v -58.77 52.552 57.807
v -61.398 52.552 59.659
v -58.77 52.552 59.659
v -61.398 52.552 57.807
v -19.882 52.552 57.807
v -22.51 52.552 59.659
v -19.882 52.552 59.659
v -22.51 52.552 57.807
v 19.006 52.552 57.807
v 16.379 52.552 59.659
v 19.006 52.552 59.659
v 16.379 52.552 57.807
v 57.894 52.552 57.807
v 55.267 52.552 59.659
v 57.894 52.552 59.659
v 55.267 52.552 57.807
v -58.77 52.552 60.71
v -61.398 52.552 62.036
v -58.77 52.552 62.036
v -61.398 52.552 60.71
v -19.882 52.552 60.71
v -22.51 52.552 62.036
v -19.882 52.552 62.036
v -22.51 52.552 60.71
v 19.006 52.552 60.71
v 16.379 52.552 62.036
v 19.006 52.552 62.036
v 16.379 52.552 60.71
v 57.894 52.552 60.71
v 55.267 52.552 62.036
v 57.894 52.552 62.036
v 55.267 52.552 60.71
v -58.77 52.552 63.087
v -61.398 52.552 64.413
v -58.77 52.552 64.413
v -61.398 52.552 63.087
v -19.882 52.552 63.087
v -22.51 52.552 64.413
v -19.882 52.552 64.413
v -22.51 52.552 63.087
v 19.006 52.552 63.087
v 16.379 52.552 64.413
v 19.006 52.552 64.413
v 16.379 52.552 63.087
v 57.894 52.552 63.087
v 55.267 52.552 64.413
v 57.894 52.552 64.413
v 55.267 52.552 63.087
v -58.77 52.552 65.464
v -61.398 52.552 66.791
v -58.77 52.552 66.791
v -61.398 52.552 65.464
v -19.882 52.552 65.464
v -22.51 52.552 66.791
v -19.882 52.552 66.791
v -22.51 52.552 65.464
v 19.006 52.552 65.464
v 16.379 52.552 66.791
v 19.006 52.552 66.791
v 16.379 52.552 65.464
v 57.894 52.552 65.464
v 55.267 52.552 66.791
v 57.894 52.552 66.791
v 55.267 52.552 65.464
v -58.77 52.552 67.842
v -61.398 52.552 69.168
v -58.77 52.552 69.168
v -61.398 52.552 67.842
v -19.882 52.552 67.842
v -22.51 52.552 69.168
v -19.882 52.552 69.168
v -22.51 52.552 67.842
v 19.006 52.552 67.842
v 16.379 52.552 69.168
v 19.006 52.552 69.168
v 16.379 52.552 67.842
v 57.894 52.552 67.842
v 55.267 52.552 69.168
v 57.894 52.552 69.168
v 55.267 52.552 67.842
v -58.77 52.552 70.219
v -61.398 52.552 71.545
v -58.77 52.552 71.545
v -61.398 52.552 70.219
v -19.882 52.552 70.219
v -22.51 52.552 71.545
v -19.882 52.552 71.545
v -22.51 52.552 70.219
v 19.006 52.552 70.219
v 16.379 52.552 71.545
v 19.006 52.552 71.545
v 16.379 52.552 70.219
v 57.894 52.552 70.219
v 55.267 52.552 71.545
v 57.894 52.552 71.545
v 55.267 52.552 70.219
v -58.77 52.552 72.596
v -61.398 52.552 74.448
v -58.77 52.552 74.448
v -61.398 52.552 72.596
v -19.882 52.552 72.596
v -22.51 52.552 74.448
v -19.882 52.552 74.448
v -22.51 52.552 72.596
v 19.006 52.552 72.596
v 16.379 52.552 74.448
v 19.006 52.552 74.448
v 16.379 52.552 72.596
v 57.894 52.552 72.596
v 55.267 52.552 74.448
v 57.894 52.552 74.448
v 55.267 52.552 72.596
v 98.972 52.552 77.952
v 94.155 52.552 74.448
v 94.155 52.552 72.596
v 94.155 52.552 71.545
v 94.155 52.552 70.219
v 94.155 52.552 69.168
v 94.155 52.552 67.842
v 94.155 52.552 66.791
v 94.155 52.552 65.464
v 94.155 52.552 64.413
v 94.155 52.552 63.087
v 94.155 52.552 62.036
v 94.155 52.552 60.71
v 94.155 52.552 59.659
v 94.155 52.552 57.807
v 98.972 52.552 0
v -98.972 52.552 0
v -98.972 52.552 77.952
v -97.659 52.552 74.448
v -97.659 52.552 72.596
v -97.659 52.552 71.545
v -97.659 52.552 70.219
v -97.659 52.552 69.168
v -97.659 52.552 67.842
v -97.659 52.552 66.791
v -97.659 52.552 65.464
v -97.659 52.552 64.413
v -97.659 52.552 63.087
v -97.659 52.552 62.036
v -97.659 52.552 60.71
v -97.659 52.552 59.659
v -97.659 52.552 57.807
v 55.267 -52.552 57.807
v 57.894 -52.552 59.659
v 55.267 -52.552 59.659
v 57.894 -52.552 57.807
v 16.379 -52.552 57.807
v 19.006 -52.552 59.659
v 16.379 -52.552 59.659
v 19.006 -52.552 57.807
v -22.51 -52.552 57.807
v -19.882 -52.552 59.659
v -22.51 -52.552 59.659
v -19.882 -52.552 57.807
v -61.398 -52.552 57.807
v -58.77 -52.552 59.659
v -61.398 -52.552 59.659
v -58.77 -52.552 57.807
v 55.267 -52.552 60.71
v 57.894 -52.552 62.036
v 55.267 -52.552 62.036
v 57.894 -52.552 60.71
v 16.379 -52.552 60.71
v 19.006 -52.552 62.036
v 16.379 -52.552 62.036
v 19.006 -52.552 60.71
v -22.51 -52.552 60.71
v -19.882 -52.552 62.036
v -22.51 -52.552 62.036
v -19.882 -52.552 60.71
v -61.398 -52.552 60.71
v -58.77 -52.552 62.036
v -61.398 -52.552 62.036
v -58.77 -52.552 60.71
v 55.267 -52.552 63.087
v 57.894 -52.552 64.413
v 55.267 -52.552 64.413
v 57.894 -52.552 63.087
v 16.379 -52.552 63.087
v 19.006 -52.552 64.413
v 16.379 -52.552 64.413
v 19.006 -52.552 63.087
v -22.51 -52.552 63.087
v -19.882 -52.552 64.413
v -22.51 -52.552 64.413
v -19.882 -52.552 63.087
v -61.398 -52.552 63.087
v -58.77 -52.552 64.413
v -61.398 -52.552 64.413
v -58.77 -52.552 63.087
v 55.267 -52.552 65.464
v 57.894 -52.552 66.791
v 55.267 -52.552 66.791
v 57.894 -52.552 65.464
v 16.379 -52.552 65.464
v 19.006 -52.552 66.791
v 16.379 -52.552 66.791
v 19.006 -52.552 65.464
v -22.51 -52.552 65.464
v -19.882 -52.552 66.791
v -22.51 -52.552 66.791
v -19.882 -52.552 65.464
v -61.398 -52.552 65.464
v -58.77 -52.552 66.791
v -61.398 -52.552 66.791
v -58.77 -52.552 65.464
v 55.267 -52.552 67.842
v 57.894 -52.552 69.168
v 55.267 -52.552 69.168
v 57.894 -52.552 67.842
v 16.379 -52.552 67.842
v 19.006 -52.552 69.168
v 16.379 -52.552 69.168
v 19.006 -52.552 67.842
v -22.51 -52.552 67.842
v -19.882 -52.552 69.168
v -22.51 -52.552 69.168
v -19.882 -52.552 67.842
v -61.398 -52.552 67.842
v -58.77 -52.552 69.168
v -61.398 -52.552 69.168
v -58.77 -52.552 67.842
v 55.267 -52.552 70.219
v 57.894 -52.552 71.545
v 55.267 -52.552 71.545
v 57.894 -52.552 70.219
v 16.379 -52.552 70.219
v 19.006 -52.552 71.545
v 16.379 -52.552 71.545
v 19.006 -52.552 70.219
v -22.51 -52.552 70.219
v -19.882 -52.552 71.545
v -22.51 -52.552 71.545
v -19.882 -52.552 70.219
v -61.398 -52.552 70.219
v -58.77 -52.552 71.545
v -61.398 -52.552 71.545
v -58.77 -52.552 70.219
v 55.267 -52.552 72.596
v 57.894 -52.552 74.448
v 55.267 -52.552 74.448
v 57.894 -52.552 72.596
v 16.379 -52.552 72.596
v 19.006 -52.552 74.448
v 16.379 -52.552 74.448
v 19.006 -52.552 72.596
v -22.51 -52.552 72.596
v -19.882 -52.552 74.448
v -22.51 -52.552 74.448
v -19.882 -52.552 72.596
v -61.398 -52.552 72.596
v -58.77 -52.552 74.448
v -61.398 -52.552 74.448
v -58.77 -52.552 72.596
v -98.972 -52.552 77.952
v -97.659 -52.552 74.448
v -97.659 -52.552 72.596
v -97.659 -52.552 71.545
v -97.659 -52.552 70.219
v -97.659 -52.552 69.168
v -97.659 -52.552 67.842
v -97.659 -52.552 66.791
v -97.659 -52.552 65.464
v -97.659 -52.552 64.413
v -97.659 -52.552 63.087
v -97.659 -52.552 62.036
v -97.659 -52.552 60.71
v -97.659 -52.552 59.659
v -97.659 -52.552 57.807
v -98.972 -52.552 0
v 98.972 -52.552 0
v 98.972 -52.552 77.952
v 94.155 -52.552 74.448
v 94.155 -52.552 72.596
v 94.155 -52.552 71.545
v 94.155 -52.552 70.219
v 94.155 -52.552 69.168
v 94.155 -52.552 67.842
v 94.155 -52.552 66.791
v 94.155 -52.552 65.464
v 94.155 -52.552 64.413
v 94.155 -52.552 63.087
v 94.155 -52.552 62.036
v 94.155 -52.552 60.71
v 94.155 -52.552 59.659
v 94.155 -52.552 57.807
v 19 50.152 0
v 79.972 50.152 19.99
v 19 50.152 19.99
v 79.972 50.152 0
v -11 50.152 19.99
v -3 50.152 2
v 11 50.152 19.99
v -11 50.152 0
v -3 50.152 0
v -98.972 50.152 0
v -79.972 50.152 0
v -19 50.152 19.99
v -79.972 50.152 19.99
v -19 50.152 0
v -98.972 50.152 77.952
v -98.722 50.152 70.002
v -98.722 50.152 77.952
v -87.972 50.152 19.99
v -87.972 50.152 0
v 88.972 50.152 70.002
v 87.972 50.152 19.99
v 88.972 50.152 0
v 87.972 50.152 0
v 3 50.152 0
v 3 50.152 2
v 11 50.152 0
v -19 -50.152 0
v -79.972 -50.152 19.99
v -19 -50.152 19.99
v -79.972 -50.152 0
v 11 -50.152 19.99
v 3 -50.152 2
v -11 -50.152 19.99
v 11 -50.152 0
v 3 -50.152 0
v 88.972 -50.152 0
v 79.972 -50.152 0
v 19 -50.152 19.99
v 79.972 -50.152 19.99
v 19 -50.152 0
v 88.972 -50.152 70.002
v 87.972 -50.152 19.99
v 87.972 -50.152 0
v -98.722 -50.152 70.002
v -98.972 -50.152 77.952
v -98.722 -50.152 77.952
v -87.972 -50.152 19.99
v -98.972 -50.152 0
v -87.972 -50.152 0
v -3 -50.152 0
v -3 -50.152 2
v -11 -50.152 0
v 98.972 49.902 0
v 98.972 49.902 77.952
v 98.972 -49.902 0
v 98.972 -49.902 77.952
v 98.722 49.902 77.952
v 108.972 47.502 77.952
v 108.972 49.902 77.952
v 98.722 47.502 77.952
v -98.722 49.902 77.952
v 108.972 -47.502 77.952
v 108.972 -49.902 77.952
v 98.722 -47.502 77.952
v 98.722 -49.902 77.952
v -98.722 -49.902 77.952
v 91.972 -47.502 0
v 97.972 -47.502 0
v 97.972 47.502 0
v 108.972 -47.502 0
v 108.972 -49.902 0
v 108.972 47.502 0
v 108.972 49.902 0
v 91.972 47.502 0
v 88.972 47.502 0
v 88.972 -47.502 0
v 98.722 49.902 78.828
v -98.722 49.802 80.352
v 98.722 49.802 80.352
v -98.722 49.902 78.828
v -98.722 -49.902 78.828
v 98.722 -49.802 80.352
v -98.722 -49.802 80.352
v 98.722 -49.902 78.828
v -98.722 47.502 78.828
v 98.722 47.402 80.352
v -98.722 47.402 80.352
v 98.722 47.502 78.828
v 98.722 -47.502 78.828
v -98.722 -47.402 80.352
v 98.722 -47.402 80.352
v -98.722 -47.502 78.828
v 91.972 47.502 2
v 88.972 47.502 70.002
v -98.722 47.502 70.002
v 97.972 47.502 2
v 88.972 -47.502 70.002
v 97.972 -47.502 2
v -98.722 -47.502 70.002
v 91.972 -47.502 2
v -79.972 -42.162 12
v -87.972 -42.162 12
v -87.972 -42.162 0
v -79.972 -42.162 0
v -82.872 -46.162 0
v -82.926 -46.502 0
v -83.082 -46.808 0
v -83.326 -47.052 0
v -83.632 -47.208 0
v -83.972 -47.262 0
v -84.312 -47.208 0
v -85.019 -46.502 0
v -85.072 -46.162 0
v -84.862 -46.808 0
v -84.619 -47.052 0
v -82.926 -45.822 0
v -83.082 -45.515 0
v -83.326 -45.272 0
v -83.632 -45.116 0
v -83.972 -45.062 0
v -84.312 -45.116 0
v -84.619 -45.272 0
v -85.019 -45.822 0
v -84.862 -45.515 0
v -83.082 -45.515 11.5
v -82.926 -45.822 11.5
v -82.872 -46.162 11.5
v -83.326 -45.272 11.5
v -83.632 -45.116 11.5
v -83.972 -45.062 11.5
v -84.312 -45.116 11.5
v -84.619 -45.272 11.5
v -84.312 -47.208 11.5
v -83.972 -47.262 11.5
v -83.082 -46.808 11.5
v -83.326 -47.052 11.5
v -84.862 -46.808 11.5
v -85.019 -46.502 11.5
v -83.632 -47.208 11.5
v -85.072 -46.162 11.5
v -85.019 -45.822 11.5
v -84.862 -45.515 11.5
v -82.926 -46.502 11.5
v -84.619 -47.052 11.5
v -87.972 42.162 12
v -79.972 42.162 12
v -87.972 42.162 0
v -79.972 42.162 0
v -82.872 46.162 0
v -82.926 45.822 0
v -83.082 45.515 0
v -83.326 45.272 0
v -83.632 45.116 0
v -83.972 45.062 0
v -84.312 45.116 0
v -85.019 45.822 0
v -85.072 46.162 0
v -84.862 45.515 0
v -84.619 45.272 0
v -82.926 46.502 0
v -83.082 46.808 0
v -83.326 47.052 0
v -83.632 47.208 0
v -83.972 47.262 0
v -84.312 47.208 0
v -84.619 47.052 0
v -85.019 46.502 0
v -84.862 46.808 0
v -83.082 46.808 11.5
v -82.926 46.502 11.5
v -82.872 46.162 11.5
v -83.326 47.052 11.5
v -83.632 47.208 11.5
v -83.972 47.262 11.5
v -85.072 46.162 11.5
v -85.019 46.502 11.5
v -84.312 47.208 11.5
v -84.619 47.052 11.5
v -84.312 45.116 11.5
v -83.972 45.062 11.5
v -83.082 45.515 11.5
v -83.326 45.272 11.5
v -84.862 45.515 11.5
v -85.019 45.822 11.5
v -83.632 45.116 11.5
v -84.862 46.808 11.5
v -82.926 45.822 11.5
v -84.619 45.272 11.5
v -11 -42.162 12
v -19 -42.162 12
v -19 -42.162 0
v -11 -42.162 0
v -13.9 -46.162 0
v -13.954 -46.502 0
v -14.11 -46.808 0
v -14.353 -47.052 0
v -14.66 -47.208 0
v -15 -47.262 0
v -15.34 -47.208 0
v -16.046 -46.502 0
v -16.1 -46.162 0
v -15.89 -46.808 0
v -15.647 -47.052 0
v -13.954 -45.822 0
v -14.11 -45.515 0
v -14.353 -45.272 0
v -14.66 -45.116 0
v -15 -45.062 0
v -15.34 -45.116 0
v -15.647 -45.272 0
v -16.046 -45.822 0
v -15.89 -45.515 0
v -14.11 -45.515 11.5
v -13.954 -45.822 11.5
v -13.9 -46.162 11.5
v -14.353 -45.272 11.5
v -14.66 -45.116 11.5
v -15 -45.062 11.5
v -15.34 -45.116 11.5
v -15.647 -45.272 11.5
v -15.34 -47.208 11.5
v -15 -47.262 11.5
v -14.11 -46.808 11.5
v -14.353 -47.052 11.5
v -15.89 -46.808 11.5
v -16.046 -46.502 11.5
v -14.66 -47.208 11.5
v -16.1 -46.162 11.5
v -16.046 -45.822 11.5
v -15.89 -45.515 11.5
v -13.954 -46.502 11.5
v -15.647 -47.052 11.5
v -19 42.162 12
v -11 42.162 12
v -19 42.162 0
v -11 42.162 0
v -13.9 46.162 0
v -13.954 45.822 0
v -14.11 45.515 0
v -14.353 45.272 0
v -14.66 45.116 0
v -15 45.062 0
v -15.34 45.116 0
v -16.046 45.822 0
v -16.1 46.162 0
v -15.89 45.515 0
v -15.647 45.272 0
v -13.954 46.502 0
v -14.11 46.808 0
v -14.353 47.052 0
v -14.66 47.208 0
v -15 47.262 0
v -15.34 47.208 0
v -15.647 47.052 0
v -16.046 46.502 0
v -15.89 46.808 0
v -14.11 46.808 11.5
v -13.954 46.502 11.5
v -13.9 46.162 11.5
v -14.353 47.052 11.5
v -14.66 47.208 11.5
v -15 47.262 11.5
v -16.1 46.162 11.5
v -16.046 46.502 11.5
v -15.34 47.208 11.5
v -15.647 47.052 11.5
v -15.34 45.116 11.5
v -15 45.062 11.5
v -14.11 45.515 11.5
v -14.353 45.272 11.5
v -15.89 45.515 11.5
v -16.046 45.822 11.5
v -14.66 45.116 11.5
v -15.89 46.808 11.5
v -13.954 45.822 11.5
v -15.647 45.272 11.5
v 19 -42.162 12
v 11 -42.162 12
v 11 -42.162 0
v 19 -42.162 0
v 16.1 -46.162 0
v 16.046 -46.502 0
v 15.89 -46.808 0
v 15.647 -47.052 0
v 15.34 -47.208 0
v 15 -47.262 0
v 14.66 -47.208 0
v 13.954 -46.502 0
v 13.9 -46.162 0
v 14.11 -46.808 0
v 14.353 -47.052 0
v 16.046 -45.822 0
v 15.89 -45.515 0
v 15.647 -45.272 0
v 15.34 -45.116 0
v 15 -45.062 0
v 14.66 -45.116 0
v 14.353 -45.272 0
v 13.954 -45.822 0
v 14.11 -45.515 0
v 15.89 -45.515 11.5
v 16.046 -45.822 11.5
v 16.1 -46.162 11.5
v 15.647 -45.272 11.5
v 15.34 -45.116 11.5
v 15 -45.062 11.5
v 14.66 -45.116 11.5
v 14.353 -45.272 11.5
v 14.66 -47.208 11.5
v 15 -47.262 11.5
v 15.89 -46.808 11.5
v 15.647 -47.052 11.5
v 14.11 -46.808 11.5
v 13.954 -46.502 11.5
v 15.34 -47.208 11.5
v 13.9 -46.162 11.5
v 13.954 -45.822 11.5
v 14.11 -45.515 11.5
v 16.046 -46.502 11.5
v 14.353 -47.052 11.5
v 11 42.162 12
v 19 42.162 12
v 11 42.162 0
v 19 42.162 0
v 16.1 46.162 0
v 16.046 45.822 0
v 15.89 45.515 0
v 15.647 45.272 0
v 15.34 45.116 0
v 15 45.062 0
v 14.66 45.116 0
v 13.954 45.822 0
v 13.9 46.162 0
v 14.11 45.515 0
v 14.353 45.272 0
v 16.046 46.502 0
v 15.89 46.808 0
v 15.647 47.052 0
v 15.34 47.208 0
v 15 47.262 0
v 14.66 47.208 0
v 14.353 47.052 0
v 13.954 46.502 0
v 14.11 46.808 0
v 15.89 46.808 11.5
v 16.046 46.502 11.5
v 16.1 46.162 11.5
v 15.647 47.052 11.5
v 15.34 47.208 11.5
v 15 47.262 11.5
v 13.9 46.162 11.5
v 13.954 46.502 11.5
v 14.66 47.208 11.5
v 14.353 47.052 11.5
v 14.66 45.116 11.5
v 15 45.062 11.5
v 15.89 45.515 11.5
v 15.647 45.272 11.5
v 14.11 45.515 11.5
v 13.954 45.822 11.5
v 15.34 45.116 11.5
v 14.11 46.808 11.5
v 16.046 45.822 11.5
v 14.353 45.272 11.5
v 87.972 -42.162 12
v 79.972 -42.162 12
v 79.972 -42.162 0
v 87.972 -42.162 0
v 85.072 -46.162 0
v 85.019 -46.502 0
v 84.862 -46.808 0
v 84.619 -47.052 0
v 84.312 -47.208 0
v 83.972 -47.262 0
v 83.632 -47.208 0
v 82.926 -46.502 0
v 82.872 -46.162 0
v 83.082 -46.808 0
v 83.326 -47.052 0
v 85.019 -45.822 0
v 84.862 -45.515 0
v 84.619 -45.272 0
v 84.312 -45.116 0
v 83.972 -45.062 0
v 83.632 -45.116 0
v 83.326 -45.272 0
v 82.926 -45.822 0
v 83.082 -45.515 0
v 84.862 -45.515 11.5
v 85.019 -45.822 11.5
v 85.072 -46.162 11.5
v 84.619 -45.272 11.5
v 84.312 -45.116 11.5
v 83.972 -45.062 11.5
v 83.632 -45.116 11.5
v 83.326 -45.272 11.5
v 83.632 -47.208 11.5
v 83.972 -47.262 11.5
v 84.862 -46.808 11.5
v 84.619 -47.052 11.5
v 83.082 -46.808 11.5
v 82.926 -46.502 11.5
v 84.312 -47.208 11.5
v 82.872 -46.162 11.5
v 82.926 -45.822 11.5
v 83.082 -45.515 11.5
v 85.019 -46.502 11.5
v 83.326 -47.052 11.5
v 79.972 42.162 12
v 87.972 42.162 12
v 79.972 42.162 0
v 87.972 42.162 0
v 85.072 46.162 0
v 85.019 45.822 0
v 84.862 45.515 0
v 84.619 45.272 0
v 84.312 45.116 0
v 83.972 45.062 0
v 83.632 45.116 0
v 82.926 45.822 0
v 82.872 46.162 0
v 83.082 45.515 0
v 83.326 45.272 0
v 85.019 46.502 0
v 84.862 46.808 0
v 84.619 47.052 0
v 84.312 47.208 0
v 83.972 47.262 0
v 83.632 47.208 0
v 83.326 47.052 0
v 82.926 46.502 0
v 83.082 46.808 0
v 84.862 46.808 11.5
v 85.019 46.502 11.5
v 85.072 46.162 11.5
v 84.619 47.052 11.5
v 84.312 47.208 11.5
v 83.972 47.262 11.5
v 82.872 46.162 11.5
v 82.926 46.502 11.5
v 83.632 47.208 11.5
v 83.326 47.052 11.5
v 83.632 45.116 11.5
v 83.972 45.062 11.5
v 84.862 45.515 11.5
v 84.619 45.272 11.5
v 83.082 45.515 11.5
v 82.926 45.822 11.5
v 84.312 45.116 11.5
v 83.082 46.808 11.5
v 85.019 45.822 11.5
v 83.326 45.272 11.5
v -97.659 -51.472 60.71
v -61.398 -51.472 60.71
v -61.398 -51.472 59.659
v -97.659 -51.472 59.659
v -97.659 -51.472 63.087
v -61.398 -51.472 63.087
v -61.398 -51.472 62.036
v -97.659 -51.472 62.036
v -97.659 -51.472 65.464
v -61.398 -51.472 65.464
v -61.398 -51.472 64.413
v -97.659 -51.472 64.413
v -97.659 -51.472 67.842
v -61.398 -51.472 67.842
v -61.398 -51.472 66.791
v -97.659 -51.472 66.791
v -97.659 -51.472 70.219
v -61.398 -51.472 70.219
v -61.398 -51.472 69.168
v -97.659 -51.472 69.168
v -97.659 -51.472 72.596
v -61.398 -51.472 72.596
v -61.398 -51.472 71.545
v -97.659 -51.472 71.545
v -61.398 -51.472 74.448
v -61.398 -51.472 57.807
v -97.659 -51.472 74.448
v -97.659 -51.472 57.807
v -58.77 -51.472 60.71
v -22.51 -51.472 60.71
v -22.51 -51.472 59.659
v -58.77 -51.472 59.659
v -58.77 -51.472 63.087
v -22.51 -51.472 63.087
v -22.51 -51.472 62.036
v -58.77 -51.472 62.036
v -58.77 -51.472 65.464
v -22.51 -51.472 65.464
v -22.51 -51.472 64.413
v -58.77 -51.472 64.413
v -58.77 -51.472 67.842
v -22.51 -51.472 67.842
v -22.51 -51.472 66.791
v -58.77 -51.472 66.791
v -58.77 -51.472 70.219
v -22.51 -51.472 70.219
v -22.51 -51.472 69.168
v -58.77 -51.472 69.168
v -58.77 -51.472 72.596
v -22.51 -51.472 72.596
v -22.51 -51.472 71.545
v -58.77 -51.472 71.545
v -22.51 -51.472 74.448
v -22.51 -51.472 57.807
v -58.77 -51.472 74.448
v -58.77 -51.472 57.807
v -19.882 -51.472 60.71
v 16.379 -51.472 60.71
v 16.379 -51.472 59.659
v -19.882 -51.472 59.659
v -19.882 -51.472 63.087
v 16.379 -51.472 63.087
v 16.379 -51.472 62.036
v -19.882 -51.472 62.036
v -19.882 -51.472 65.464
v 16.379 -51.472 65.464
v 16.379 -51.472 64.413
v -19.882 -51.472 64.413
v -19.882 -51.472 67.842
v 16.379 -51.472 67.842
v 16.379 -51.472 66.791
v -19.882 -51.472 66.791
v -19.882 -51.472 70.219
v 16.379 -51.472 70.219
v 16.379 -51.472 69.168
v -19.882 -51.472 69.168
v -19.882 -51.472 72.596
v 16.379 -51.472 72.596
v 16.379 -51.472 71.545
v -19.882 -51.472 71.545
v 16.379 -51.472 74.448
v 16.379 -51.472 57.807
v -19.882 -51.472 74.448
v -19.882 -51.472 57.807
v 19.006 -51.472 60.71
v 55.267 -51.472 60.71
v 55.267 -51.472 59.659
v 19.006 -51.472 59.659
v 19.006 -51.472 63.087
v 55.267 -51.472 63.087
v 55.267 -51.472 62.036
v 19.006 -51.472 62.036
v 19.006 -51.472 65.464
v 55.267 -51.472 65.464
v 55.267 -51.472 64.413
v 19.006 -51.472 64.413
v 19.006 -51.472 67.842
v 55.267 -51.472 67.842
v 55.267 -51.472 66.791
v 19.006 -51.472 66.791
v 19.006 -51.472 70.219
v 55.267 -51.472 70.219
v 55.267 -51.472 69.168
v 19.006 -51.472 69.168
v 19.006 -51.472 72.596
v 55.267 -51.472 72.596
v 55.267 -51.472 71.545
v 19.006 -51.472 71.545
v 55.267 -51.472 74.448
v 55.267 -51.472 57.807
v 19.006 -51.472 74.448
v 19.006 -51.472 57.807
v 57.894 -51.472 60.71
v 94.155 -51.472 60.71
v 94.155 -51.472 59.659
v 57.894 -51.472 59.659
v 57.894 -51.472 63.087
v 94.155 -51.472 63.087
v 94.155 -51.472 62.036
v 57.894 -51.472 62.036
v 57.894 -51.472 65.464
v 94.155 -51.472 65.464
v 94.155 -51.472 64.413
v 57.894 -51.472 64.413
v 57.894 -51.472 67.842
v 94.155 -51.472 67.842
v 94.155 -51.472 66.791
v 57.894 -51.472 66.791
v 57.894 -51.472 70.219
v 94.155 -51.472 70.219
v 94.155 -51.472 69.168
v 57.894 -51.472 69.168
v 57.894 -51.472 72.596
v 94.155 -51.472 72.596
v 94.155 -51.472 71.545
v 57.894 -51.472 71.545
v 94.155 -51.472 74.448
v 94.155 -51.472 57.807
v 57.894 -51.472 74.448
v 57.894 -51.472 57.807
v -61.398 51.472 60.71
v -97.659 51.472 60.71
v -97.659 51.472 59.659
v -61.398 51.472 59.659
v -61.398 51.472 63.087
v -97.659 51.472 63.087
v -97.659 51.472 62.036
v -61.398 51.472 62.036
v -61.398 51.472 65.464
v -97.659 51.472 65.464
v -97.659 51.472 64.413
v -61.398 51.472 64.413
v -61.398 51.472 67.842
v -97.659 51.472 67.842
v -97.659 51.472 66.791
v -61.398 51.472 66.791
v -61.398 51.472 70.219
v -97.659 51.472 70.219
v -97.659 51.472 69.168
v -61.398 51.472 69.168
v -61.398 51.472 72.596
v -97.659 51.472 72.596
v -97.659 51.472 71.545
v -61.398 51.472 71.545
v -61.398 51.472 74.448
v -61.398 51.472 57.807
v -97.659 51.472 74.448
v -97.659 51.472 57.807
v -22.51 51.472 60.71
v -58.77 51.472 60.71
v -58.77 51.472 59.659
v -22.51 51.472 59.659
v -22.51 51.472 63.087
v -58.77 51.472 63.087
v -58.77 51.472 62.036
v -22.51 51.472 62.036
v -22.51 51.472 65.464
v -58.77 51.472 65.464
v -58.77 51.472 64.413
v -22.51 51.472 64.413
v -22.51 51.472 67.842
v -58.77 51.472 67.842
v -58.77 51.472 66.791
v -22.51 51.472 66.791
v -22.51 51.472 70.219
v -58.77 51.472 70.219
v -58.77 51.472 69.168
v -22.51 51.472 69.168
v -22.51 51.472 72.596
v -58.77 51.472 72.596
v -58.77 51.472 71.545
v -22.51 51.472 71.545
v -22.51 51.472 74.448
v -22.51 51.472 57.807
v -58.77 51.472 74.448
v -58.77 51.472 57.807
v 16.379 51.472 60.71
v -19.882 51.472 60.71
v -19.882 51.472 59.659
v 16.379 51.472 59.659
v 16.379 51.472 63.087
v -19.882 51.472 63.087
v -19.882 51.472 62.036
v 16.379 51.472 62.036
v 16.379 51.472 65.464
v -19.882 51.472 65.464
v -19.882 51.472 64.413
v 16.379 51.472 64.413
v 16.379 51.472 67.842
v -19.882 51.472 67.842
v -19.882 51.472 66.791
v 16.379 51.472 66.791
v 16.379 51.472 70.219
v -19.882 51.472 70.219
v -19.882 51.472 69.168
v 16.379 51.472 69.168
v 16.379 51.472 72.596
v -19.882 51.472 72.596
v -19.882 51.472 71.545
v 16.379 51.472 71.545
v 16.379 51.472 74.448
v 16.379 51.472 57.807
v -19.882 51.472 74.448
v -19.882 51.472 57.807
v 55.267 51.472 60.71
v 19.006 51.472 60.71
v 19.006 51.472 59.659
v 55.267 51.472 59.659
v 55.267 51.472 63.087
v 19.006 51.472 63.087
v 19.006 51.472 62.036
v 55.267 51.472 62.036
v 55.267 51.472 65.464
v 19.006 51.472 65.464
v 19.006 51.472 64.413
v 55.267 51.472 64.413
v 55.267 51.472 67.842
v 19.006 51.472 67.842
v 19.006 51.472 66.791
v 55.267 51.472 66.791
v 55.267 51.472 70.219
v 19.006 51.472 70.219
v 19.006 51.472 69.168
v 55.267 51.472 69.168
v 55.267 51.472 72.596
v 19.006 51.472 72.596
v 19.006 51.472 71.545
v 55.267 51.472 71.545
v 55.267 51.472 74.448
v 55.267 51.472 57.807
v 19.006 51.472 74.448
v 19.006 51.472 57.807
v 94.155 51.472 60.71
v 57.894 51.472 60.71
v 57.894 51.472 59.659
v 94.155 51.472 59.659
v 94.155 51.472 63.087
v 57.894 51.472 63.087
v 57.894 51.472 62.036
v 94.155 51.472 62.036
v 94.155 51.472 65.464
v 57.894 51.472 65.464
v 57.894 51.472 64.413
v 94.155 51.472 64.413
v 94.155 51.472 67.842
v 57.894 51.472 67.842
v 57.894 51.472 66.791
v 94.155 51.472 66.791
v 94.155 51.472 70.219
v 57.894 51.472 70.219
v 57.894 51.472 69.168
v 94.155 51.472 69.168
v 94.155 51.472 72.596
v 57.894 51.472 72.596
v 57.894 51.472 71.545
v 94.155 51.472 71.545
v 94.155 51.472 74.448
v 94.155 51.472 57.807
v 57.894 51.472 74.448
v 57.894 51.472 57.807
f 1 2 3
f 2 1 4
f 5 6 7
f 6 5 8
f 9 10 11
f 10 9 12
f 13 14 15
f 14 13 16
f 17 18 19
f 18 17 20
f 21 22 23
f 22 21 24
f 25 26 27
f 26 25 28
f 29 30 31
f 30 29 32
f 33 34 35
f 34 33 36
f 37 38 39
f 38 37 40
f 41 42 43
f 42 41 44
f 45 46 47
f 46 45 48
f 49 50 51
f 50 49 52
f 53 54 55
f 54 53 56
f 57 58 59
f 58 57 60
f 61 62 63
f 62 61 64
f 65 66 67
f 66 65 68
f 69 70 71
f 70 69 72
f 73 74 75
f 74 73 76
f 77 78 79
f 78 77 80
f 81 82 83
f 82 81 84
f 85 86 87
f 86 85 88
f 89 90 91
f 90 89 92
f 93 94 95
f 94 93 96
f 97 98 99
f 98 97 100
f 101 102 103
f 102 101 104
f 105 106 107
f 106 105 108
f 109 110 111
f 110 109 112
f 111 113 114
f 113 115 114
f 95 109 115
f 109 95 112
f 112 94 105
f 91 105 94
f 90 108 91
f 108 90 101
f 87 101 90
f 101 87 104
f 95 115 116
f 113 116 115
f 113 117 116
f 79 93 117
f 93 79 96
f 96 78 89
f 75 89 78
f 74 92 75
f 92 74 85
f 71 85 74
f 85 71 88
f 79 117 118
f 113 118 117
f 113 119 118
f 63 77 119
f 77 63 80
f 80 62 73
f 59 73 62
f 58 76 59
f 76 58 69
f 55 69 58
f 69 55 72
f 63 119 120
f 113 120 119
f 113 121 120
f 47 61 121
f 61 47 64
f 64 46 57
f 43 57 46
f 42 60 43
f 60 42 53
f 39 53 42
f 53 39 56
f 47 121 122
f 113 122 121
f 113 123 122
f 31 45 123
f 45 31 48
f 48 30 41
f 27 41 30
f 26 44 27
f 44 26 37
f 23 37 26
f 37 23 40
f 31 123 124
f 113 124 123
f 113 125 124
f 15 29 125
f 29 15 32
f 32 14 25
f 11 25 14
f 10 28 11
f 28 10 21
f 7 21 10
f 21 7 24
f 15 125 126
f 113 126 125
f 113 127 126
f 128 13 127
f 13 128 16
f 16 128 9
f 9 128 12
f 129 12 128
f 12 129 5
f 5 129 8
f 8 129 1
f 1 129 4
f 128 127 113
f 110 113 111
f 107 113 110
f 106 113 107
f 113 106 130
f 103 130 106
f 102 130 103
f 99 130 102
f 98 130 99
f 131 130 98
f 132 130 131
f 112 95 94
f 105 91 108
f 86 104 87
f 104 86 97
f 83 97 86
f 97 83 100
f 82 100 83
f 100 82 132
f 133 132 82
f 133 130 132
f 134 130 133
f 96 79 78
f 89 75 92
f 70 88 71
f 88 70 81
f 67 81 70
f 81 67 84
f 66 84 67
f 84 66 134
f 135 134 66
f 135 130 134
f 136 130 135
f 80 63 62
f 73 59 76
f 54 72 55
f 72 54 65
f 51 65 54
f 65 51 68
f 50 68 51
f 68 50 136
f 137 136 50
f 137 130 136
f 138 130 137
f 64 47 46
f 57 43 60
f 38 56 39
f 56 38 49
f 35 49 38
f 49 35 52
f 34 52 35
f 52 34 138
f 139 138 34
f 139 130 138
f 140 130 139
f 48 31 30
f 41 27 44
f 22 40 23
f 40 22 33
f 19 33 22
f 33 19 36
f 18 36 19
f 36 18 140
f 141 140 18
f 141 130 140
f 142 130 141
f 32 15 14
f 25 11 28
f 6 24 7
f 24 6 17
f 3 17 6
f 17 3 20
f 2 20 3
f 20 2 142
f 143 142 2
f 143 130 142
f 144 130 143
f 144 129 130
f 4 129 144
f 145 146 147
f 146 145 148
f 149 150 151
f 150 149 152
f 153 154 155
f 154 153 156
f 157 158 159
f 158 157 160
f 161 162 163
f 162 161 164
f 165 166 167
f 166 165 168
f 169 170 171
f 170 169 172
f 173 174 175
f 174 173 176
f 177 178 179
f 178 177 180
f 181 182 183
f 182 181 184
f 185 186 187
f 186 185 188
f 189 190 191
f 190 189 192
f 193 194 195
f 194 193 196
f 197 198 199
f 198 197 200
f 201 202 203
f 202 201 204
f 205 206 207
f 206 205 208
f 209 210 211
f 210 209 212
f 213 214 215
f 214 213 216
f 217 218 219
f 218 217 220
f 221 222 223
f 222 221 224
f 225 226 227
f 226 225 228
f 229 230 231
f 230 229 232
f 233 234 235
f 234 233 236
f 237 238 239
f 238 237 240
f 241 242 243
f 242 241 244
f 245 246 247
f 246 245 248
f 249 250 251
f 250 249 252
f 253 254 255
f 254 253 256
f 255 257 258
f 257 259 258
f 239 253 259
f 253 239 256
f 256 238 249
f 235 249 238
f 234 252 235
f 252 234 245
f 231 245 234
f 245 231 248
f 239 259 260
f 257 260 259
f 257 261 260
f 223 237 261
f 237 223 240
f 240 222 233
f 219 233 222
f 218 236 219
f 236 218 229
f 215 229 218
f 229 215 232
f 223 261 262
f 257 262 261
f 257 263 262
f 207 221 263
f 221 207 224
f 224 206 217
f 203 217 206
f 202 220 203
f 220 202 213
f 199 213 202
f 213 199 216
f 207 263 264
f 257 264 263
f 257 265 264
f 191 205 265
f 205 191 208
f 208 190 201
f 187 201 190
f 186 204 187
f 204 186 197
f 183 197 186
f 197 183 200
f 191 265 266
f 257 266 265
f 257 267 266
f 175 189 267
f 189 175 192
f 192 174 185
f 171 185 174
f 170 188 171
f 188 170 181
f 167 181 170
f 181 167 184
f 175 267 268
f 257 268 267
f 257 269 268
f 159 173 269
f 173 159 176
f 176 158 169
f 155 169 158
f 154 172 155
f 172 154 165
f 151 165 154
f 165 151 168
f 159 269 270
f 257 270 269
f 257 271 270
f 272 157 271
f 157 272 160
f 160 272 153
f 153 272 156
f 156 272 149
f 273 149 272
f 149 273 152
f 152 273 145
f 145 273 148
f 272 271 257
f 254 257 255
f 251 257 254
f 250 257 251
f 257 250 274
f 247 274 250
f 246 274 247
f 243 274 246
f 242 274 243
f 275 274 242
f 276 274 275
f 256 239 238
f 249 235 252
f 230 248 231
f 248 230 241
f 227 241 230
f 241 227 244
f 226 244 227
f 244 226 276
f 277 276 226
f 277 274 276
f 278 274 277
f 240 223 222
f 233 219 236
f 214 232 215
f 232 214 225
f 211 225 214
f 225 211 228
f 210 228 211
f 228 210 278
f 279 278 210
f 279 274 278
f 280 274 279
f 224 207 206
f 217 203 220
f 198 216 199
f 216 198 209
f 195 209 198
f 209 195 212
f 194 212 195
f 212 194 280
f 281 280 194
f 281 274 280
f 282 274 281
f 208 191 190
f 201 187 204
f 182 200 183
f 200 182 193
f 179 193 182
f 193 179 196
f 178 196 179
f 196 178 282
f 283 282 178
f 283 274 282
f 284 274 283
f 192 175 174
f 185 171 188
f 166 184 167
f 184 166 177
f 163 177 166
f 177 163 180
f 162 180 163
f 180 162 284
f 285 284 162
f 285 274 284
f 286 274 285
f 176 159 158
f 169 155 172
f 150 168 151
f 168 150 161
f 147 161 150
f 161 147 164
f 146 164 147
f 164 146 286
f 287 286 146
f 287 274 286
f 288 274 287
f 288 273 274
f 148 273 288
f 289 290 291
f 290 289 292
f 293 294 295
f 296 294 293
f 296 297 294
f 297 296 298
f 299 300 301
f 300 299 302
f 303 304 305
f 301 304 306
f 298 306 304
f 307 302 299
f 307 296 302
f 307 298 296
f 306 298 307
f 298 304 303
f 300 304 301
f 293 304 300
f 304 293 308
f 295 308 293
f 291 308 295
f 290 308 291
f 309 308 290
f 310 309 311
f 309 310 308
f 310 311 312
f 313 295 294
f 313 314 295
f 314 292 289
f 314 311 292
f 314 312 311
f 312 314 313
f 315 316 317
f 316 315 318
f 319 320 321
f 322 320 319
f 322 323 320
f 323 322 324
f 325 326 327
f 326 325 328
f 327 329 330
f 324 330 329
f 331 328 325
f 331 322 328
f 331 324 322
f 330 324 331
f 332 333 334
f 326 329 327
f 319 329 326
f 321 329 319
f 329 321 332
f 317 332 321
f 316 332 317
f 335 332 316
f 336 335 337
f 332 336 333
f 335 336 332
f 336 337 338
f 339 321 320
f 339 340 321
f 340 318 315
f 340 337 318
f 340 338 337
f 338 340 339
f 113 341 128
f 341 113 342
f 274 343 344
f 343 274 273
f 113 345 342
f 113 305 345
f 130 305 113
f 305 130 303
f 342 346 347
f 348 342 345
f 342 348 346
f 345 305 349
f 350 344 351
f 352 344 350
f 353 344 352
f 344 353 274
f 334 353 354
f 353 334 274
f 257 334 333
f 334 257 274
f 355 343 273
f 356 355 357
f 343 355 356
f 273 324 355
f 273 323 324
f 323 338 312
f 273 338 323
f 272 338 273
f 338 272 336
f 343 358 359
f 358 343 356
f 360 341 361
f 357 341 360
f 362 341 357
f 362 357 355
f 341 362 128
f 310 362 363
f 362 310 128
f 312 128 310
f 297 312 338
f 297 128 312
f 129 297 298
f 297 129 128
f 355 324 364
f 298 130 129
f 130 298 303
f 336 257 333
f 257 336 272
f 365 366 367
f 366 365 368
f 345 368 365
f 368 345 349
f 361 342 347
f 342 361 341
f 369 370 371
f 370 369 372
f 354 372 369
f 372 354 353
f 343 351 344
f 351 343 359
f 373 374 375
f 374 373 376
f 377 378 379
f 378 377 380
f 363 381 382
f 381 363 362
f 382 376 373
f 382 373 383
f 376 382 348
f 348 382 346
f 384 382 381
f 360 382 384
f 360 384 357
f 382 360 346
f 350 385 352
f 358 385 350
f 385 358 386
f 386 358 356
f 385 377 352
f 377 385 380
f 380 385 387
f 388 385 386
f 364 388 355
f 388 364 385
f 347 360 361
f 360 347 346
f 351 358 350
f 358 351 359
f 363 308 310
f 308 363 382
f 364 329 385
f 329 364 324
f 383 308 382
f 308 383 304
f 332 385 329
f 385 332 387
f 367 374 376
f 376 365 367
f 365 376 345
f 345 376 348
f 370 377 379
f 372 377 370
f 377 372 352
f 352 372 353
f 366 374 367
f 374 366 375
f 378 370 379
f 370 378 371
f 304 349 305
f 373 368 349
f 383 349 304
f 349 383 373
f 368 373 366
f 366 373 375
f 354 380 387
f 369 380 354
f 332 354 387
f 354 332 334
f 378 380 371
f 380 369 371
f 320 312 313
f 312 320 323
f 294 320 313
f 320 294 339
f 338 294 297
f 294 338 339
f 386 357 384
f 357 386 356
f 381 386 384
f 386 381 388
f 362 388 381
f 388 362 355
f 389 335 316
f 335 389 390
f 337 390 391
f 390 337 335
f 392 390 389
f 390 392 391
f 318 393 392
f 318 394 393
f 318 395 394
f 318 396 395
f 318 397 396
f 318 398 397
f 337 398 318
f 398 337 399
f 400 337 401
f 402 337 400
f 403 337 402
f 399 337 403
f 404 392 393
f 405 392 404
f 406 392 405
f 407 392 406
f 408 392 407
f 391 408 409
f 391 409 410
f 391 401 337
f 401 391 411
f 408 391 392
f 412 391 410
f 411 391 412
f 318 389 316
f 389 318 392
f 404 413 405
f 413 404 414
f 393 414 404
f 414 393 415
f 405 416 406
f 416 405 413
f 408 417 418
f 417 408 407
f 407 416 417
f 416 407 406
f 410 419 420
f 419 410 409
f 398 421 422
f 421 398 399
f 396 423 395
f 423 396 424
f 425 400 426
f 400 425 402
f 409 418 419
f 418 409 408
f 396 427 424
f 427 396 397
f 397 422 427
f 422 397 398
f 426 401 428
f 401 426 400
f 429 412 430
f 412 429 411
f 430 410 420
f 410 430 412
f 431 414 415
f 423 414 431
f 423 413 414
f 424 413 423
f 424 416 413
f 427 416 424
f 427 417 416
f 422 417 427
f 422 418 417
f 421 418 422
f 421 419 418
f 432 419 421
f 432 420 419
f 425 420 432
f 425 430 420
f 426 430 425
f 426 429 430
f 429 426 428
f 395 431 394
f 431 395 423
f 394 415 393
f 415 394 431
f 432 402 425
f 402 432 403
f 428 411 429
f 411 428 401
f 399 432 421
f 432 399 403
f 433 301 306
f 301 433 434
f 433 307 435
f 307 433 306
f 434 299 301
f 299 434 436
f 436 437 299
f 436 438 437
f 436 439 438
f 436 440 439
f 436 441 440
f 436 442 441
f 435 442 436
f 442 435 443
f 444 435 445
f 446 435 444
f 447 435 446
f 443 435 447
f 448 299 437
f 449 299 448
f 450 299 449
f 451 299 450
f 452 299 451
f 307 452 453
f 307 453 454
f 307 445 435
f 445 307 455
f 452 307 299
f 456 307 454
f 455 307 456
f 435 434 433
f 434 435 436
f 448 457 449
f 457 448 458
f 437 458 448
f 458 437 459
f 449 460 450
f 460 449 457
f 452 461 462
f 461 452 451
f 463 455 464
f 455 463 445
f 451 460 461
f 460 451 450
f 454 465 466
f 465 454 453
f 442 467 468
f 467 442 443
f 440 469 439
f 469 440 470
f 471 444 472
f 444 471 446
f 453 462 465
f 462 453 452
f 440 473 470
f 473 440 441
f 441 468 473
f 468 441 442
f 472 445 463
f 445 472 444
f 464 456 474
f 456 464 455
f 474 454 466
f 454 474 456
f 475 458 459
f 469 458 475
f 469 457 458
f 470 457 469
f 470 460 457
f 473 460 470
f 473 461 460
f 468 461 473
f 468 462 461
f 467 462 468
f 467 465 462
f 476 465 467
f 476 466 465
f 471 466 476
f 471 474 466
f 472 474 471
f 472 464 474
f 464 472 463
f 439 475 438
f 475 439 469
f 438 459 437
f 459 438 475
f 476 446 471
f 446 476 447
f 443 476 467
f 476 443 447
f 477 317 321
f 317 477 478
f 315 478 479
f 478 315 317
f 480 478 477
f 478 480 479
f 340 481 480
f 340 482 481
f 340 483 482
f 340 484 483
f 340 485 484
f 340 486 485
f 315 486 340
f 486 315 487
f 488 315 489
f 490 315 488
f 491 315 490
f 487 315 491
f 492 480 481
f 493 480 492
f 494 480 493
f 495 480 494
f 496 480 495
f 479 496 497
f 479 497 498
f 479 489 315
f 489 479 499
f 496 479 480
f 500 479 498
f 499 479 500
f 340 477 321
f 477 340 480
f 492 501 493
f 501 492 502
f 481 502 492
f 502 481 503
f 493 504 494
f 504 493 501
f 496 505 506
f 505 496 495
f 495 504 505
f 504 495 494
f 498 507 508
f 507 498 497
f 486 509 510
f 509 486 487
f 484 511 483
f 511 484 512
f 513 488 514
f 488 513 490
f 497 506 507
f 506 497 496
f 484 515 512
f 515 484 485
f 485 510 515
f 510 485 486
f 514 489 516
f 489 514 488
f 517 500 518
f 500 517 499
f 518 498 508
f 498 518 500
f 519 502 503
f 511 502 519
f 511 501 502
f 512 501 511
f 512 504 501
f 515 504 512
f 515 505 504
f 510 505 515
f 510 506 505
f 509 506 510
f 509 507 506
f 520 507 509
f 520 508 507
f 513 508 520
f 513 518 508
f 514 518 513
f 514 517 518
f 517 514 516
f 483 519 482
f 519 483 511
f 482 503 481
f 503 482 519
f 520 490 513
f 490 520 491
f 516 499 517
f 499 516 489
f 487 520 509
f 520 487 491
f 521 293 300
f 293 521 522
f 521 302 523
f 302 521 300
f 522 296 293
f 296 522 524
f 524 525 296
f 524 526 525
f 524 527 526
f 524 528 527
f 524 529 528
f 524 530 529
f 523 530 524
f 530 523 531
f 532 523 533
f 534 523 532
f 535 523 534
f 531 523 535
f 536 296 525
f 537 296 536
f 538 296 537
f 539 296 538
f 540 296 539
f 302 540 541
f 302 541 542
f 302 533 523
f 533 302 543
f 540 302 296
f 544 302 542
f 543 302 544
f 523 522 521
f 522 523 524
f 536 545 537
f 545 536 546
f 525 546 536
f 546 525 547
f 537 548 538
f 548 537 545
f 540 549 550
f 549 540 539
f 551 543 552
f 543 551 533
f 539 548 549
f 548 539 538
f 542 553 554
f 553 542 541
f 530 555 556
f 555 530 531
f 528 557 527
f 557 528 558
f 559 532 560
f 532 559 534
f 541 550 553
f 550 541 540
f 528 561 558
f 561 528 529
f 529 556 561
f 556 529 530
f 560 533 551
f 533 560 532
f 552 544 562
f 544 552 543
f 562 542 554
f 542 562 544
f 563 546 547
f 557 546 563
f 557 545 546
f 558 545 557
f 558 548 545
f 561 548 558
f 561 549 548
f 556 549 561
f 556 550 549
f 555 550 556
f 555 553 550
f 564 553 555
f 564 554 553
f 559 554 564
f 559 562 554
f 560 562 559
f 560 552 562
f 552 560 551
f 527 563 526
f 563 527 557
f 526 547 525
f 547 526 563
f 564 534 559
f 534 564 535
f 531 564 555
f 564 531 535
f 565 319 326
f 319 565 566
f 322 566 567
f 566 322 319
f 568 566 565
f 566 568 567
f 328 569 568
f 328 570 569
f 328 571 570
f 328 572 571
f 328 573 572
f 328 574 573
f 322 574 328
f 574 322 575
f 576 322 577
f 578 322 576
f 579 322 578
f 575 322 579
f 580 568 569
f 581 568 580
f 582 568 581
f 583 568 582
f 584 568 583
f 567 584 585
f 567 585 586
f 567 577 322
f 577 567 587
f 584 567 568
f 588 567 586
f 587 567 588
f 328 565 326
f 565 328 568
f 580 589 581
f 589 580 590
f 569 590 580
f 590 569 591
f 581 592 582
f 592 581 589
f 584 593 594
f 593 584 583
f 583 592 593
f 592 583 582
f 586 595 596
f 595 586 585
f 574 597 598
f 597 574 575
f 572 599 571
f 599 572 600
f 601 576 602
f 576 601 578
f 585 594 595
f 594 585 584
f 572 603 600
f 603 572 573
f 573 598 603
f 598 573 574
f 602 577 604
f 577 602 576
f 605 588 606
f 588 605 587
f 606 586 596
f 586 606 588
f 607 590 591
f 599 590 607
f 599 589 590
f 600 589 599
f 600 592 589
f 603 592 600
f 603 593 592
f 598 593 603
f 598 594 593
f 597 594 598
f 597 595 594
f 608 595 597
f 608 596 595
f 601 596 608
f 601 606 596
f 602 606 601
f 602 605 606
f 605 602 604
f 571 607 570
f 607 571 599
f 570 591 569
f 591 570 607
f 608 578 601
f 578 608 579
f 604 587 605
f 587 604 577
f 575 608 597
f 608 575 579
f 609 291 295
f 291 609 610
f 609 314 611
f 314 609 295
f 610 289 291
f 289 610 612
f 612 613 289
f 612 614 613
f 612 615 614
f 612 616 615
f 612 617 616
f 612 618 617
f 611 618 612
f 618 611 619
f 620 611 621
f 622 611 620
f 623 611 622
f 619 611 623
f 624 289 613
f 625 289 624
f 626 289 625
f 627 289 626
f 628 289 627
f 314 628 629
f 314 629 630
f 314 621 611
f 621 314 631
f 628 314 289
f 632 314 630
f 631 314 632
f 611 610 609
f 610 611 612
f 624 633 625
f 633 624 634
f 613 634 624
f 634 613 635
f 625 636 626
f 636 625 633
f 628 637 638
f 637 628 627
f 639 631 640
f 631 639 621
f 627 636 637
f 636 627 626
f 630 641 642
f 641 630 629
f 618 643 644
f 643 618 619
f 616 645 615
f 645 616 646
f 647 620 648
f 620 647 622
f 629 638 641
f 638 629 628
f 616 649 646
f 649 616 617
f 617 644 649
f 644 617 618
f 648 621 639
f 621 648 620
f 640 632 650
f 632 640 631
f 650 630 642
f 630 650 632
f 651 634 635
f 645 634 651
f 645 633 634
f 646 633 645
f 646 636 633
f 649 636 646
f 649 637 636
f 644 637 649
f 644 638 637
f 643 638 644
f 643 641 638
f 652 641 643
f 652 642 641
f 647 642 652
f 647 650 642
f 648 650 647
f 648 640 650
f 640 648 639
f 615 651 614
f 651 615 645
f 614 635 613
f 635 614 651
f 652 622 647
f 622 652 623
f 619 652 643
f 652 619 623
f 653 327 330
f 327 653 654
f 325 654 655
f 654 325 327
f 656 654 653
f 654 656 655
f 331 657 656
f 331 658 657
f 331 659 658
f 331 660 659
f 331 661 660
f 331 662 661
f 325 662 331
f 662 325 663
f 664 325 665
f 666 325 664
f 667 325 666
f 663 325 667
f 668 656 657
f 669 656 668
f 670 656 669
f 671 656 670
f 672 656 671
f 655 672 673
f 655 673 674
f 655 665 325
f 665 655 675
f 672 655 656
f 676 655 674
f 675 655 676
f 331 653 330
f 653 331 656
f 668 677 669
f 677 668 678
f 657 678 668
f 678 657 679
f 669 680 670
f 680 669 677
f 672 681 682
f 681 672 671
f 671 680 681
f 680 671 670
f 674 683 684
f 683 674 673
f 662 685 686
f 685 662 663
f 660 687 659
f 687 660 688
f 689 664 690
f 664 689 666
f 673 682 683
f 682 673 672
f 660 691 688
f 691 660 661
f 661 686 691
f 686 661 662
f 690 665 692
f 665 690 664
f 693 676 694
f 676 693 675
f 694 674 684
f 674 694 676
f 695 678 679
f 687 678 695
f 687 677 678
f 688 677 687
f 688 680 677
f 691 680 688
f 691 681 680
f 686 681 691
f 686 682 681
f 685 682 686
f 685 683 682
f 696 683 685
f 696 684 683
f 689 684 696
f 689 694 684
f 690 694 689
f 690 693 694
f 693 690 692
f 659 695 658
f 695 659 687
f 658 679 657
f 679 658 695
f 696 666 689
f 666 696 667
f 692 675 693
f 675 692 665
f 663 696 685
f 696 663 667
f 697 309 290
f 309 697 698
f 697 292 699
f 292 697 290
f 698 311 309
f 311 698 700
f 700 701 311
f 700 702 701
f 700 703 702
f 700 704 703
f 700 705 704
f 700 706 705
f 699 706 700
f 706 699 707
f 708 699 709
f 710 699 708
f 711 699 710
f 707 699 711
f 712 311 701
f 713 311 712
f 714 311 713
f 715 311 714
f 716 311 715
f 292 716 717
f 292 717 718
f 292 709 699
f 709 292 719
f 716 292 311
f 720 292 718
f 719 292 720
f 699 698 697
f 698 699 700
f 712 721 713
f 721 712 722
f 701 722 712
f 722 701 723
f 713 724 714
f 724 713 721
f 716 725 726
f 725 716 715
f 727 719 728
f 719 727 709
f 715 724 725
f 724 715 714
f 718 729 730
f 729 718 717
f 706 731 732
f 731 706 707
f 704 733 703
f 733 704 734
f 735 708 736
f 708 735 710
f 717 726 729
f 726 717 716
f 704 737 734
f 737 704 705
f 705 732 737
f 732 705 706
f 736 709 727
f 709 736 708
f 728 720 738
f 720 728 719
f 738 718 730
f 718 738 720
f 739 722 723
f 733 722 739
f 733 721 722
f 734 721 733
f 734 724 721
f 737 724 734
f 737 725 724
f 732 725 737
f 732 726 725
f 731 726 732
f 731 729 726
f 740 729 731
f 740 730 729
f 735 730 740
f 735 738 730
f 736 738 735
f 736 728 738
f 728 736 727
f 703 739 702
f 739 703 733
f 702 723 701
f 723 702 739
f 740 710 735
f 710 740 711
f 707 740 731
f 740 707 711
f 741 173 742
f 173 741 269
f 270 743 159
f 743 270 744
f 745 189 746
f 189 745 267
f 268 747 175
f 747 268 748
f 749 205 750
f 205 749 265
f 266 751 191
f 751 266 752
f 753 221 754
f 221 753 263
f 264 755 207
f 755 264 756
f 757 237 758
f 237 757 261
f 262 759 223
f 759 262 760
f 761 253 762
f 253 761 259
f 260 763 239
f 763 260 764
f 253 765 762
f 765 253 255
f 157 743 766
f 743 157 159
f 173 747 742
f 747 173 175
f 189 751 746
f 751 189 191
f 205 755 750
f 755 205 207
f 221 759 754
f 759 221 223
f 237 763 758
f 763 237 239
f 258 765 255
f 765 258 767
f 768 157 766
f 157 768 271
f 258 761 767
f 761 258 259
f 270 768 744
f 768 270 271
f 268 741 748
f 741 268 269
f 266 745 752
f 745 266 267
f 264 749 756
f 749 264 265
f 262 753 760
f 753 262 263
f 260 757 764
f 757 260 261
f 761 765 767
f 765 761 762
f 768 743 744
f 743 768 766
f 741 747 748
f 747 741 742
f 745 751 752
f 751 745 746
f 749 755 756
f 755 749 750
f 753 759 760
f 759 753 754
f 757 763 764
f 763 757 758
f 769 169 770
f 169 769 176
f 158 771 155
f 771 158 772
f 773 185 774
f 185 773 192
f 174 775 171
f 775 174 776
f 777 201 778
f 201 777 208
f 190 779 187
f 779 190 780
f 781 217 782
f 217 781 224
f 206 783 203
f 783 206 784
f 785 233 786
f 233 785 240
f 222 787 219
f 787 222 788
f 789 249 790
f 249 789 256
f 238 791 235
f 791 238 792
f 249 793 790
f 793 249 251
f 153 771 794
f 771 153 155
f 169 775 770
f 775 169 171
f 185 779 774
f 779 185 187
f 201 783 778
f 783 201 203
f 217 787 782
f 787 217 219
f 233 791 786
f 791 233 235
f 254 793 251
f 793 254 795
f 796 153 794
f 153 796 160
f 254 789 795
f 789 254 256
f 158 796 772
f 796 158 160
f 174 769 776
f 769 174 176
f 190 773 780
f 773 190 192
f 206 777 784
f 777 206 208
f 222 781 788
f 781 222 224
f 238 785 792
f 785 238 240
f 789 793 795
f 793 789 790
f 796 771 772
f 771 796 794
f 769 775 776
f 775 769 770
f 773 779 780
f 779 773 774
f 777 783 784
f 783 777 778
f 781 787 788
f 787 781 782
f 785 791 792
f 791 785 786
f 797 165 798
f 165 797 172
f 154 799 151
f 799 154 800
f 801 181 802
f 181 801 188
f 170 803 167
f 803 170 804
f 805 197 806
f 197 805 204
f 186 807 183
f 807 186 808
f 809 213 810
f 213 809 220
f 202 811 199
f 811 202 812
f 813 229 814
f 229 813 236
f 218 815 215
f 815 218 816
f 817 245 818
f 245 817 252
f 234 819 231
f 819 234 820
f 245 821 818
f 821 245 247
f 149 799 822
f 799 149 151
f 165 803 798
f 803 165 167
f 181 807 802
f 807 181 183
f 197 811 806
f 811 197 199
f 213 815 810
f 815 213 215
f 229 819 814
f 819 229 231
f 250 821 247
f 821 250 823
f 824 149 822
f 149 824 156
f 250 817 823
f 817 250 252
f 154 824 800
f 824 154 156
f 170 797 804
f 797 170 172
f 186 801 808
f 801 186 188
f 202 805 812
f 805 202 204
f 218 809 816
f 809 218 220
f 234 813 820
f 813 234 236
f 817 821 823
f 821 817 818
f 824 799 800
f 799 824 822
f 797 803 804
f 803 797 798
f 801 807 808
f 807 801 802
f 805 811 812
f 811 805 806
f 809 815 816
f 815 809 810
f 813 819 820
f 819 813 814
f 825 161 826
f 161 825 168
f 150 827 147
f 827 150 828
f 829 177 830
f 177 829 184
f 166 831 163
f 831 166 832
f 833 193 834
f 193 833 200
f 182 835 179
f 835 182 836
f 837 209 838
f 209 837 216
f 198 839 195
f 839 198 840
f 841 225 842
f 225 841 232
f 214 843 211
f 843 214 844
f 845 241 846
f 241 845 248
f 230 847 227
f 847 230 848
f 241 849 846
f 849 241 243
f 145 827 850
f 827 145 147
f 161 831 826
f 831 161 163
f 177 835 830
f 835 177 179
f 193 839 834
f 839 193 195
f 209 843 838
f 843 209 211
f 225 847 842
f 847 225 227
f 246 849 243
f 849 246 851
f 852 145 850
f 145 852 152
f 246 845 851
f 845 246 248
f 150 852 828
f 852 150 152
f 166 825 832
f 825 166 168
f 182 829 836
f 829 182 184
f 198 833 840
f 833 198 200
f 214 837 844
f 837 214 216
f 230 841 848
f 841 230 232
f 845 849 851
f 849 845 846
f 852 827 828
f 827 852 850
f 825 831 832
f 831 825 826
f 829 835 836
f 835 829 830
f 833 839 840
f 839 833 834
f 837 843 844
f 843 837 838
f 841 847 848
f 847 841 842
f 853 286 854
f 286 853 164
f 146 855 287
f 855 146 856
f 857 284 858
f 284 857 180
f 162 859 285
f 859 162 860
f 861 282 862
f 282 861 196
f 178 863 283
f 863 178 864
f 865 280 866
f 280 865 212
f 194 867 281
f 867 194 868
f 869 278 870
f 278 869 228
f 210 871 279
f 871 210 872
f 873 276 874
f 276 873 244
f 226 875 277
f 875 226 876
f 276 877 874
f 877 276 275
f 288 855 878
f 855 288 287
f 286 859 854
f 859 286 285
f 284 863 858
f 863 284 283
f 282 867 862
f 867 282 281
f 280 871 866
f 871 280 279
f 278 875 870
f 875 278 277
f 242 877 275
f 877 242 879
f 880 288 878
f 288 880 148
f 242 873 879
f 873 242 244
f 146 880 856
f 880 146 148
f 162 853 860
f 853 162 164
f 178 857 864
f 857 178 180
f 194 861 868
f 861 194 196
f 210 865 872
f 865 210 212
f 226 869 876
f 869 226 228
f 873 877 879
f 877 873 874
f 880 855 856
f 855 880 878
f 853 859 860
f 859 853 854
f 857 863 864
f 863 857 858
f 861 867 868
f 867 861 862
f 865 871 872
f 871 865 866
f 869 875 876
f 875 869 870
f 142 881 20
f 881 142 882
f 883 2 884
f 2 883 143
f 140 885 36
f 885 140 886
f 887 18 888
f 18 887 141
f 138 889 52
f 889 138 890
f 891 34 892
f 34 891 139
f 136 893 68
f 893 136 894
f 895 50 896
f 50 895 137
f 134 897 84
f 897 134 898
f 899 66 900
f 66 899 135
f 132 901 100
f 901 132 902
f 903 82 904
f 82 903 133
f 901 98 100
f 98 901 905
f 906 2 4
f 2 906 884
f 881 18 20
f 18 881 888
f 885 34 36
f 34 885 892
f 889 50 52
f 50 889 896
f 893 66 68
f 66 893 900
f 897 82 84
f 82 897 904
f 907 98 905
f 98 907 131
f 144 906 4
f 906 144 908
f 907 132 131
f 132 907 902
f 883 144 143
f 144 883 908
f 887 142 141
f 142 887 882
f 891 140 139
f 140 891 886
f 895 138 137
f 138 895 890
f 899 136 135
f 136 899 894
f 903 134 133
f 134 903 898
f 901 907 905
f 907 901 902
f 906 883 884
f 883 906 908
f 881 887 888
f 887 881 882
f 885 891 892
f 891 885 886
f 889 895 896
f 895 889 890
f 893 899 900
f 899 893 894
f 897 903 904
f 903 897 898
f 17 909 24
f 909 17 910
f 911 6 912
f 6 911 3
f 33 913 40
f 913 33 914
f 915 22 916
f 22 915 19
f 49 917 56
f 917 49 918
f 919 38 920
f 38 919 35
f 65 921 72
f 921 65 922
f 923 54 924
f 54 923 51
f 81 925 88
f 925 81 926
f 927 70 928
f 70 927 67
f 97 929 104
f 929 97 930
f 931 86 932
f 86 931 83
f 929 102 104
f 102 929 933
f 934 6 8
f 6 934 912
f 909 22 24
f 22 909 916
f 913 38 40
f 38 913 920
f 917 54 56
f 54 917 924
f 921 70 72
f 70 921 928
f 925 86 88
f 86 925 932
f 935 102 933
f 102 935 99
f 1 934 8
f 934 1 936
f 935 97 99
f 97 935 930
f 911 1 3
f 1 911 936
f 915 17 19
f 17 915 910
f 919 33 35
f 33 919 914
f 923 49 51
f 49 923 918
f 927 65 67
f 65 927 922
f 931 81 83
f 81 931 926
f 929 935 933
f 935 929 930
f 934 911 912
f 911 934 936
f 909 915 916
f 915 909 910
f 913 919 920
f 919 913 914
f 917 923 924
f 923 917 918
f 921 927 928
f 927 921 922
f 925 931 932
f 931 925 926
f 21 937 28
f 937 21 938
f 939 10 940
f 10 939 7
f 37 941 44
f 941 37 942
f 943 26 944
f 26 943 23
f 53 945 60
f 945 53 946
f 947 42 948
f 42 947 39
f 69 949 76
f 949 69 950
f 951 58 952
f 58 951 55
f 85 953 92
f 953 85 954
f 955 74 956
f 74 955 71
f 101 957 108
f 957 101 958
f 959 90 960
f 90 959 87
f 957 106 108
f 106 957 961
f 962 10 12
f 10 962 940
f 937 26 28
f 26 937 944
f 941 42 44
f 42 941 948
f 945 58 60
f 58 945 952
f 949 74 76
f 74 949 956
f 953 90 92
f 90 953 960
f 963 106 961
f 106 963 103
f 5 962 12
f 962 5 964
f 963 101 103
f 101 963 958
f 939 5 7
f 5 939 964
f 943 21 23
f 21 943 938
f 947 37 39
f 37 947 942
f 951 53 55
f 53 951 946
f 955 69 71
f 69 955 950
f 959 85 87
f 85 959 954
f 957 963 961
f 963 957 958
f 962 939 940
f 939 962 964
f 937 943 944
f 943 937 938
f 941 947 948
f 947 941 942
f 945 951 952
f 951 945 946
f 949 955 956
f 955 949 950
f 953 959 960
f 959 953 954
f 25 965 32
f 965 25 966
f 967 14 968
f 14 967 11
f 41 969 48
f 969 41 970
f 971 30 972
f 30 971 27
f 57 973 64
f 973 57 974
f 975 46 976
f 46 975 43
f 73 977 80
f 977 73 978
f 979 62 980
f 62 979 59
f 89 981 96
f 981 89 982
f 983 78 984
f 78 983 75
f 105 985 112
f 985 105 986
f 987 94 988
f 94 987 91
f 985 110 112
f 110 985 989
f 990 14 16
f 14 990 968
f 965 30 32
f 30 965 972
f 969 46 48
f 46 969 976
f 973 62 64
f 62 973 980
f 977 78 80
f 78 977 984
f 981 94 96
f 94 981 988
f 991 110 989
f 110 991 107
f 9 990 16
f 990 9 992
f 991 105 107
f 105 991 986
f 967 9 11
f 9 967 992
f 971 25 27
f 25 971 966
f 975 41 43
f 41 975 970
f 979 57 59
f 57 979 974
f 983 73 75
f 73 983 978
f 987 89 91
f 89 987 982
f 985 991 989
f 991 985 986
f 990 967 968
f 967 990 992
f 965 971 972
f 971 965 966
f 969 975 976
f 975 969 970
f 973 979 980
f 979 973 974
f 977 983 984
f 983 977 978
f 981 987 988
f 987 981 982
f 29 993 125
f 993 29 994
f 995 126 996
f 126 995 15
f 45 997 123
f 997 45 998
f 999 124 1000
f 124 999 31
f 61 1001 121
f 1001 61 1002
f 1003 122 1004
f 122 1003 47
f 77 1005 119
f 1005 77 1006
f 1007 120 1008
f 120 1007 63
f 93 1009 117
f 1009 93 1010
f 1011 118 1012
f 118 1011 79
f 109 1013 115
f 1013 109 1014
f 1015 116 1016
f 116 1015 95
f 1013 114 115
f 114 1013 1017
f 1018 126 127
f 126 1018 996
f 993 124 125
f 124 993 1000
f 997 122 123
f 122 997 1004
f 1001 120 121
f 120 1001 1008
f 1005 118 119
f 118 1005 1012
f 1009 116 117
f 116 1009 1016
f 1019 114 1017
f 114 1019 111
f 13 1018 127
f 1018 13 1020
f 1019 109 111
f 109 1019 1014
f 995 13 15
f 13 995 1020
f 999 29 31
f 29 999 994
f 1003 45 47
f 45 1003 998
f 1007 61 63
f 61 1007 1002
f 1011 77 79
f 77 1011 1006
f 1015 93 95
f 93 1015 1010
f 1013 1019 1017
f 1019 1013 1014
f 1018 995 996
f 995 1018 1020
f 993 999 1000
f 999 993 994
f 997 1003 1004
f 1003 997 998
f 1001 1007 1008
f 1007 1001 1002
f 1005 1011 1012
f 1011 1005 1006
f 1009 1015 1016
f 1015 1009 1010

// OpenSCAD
// Milwaukee Road Little Joe, G scale 1-29 - print 3 of 20: body_3 - sides and ends, section 3 (print upright)
// Render (F6), export STL, print. Settings: ../../library/lj_params.scad
// Whole loco preview and notes: ../../MILW_LittleJoe_Main.scad
SCALE_SEL = "G";
LOCO_SEL = "E70";   // [E20, E21, E70, E71, E72, E73, E74, E75, E76, E77, E78, E79] the body and roof change for E20 / E21
include <../../library/lj_all.scad>
lj_plate("body_3");
